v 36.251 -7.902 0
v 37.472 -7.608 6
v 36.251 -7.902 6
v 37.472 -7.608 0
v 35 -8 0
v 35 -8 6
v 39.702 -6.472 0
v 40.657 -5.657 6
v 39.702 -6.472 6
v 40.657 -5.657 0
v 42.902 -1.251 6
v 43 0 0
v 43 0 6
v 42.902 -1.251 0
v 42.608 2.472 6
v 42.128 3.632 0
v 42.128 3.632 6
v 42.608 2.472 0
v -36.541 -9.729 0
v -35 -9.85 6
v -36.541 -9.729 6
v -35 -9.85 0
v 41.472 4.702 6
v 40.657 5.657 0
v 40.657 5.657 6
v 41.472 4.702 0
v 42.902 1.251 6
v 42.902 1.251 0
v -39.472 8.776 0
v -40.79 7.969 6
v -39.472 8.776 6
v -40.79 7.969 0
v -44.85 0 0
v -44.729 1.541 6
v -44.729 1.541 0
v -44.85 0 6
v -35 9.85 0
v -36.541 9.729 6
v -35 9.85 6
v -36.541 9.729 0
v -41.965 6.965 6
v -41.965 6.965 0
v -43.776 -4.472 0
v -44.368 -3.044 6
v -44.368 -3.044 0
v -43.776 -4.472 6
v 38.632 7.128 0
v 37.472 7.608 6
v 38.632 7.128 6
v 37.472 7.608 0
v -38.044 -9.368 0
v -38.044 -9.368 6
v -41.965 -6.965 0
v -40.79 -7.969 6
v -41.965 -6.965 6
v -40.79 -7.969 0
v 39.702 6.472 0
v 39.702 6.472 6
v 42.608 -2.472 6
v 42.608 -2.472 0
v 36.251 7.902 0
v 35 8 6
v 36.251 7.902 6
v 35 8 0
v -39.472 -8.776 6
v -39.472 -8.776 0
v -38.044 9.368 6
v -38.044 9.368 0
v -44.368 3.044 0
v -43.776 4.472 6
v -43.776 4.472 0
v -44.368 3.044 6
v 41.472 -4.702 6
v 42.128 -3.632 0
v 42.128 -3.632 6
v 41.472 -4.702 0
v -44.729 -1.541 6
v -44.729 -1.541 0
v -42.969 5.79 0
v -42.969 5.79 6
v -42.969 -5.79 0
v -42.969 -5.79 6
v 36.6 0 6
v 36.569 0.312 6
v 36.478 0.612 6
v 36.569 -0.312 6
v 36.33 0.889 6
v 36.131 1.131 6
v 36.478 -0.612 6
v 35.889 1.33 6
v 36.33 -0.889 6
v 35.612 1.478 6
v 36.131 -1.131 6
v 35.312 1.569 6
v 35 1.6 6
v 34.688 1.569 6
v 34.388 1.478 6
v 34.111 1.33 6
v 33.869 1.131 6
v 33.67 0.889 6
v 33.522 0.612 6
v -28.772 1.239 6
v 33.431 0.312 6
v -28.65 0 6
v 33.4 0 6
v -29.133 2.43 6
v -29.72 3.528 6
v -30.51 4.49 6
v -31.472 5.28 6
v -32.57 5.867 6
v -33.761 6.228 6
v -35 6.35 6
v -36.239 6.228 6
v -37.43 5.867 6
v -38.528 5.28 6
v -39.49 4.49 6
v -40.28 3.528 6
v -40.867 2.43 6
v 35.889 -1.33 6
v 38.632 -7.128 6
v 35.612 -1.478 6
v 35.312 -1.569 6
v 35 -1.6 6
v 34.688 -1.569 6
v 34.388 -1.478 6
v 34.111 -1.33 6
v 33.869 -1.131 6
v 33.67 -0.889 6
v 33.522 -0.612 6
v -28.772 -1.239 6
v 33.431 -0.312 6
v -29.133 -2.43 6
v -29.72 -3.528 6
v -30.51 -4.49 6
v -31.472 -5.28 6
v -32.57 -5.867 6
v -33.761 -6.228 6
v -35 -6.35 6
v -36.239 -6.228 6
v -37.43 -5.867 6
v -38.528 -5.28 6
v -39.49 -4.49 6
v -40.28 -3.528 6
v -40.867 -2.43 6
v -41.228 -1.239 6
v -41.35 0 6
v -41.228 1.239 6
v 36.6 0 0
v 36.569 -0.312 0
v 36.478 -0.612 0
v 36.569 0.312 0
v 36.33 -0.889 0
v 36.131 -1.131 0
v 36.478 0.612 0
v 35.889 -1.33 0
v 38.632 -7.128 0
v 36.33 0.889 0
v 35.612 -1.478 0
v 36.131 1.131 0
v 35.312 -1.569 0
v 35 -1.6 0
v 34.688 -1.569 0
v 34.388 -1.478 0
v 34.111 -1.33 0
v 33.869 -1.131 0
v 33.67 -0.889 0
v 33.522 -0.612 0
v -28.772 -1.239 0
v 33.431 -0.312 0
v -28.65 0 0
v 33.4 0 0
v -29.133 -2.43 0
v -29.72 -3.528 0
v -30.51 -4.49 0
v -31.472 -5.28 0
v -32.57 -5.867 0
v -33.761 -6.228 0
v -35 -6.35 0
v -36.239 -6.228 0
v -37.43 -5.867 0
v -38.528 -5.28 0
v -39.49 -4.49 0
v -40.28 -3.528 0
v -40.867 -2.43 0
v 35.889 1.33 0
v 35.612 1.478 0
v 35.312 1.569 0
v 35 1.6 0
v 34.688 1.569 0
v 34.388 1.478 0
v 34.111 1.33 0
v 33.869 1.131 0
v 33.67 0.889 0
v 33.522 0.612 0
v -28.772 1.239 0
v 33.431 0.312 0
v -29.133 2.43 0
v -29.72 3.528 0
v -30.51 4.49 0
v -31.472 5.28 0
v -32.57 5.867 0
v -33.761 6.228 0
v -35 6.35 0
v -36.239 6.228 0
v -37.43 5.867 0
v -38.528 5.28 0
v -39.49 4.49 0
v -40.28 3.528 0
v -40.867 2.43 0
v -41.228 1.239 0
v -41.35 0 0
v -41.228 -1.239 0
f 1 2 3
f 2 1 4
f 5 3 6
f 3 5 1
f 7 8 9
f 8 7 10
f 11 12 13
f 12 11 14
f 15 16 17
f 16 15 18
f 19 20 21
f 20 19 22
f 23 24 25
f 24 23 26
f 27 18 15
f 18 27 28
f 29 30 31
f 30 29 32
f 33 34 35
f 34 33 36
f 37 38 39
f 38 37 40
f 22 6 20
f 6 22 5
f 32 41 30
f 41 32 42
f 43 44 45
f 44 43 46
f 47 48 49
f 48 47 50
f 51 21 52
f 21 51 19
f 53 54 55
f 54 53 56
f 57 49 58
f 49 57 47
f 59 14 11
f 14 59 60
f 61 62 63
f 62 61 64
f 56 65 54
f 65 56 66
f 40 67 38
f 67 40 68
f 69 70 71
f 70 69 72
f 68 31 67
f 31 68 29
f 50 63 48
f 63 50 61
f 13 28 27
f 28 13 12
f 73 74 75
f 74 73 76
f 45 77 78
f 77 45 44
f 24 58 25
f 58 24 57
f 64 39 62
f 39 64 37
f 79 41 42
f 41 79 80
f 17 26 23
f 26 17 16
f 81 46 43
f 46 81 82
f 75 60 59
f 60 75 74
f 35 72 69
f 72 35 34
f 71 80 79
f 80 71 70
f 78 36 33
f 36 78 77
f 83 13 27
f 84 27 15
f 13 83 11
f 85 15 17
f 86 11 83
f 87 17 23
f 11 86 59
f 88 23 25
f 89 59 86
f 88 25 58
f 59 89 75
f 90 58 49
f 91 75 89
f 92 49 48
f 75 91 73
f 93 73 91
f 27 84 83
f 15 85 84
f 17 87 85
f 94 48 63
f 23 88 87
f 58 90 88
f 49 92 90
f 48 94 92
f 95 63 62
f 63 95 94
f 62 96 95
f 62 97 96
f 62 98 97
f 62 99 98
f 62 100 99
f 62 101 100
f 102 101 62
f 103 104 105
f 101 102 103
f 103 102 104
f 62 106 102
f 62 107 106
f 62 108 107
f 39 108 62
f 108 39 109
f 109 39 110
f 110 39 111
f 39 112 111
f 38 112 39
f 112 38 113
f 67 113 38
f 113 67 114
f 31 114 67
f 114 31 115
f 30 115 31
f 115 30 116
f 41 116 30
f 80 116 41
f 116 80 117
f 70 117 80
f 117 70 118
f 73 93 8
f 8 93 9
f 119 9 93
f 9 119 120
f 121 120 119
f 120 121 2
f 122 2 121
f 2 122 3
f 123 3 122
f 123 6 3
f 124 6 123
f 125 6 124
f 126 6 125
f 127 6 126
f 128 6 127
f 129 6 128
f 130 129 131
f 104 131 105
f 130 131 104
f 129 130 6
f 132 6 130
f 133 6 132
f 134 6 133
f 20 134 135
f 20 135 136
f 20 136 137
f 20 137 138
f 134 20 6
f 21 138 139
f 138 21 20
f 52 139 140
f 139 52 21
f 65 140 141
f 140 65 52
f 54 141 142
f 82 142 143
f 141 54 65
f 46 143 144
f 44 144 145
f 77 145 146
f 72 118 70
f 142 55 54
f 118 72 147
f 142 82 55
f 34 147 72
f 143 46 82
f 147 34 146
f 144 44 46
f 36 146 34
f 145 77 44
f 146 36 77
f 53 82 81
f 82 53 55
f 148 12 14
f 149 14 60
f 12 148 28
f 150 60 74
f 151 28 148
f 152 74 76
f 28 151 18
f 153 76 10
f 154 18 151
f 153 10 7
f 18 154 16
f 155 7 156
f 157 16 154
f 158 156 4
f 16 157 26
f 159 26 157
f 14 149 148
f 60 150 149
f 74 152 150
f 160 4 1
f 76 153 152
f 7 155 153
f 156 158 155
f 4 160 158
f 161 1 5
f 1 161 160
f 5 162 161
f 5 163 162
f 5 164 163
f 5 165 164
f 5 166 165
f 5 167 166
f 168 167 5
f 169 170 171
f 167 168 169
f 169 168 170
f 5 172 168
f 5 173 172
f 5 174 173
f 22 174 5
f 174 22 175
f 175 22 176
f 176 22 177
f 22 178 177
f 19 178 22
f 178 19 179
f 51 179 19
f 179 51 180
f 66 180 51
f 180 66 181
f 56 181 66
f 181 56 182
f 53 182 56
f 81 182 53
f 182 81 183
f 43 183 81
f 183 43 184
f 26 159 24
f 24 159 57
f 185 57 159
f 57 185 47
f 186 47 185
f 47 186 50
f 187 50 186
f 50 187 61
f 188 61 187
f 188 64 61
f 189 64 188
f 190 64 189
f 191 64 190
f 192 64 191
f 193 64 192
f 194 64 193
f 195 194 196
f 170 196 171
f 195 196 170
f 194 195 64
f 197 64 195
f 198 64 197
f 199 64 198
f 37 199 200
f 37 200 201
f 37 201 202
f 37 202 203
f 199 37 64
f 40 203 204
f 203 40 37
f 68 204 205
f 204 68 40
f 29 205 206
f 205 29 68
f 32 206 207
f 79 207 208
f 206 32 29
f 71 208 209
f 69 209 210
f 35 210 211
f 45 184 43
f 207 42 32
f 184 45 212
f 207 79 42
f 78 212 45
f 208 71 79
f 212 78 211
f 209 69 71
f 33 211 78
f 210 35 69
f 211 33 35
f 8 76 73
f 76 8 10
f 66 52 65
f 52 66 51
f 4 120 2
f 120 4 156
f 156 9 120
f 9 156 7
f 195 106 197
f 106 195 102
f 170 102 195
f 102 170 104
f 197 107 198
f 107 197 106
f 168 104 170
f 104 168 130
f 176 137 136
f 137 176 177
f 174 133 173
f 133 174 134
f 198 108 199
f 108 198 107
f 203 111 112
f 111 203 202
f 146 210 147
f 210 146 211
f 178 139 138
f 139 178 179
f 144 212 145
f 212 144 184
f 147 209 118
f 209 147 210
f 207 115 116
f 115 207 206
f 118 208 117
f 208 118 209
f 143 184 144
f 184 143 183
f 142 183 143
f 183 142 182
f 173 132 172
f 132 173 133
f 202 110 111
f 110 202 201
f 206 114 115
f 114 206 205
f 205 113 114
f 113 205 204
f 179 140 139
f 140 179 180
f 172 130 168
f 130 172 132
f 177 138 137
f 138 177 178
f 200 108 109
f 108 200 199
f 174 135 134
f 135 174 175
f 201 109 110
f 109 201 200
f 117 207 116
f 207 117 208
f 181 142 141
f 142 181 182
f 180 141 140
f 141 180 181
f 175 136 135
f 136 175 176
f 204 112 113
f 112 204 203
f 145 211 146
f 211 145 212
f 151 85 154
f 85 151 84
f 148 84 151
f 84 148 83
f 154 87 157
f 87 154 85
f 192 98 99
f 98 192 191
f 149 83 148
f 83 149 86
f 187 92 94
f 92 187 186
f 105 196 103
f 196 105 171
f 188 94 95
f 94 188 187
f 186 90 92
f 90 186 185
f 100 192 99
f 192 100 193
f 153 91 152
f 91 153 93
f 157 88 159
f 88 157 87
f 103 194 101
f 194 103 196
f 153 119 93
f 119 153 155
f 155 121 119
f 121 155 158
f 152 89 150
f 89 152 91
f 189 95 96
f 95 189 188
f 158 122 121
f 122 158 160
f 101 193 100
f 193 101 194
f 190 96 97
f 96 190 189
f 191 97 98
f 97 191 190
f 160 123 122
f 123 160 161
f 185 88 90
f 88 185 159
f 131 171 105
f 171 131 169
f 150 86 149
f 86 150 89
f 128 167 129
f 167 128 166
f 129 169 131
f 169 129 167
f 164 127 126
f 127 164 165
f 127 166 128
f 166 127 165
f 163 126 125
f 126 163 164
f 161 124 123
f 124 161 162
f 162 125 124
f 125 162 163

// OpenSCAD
$fn = 32;

// ----------------------------------------------------------------------
// Lever: 70 mm between the bosses, 6 mm thick, smooth outline
// ----------------------------------------------------------------------

// --- parameters (mm) ---
lever_l = 70;             // distance between the boss centres
boss_a = 19.7;            // first boss diameter
boss_b = 16;              // second boss diameter
bore_a = 12.7;            // first bore
bore_b = 3.2;             // second bore
lever_t = 6;              // lever thickness

lever_profile = [[-44.85, 0], [-44.729, -1.541], [-44.368, -3.044], [-43.776, -4.472], [-42.969, -5.79], [-41.965, -6.965], [-40.79, -7.969], [-39.472, -8.776], [-38.044, -9.368], [-36.541, -9.729], [-35, -9.85], [35, -8], [36.251, -7.902], [37.472, -7.608], [38.632, -7.128], [39.702, -6.472], [40.657, -5.657], [41.472, -4.702], [42.128, -3.632], [42.608, -2.472], [42.902, -1.251], [43, 0], [42.902, 1.251], [42.608, 2.472], [42.128, 3.632], [41.472, 4.702], [40.657, 5.657], [39.702, 6.472], [38.632, 7.128], [37.472, 7.608], [36.251, 7.902], [35, 8], [-35, 9.85], [-36.541, 9.729], [-38.044, 9.368], [-39.472, 8.776], [-40.79, 7.969], [-41.965, 6.965], [-42.969, 5.79], [-43.776, 4.472], [-44.368, 3.044], [-44.729, 1.541]];

difference() {
  linear_extrude(height = lever_t) polygon(lever_profile);
  translate([-35, 0, -2.5]) cylinder(h = lever_t + 5, d = bore_a);
  translate([35, 0, -2.5]) cylinder(h = lever_t + 5, d = bore_b);
}
